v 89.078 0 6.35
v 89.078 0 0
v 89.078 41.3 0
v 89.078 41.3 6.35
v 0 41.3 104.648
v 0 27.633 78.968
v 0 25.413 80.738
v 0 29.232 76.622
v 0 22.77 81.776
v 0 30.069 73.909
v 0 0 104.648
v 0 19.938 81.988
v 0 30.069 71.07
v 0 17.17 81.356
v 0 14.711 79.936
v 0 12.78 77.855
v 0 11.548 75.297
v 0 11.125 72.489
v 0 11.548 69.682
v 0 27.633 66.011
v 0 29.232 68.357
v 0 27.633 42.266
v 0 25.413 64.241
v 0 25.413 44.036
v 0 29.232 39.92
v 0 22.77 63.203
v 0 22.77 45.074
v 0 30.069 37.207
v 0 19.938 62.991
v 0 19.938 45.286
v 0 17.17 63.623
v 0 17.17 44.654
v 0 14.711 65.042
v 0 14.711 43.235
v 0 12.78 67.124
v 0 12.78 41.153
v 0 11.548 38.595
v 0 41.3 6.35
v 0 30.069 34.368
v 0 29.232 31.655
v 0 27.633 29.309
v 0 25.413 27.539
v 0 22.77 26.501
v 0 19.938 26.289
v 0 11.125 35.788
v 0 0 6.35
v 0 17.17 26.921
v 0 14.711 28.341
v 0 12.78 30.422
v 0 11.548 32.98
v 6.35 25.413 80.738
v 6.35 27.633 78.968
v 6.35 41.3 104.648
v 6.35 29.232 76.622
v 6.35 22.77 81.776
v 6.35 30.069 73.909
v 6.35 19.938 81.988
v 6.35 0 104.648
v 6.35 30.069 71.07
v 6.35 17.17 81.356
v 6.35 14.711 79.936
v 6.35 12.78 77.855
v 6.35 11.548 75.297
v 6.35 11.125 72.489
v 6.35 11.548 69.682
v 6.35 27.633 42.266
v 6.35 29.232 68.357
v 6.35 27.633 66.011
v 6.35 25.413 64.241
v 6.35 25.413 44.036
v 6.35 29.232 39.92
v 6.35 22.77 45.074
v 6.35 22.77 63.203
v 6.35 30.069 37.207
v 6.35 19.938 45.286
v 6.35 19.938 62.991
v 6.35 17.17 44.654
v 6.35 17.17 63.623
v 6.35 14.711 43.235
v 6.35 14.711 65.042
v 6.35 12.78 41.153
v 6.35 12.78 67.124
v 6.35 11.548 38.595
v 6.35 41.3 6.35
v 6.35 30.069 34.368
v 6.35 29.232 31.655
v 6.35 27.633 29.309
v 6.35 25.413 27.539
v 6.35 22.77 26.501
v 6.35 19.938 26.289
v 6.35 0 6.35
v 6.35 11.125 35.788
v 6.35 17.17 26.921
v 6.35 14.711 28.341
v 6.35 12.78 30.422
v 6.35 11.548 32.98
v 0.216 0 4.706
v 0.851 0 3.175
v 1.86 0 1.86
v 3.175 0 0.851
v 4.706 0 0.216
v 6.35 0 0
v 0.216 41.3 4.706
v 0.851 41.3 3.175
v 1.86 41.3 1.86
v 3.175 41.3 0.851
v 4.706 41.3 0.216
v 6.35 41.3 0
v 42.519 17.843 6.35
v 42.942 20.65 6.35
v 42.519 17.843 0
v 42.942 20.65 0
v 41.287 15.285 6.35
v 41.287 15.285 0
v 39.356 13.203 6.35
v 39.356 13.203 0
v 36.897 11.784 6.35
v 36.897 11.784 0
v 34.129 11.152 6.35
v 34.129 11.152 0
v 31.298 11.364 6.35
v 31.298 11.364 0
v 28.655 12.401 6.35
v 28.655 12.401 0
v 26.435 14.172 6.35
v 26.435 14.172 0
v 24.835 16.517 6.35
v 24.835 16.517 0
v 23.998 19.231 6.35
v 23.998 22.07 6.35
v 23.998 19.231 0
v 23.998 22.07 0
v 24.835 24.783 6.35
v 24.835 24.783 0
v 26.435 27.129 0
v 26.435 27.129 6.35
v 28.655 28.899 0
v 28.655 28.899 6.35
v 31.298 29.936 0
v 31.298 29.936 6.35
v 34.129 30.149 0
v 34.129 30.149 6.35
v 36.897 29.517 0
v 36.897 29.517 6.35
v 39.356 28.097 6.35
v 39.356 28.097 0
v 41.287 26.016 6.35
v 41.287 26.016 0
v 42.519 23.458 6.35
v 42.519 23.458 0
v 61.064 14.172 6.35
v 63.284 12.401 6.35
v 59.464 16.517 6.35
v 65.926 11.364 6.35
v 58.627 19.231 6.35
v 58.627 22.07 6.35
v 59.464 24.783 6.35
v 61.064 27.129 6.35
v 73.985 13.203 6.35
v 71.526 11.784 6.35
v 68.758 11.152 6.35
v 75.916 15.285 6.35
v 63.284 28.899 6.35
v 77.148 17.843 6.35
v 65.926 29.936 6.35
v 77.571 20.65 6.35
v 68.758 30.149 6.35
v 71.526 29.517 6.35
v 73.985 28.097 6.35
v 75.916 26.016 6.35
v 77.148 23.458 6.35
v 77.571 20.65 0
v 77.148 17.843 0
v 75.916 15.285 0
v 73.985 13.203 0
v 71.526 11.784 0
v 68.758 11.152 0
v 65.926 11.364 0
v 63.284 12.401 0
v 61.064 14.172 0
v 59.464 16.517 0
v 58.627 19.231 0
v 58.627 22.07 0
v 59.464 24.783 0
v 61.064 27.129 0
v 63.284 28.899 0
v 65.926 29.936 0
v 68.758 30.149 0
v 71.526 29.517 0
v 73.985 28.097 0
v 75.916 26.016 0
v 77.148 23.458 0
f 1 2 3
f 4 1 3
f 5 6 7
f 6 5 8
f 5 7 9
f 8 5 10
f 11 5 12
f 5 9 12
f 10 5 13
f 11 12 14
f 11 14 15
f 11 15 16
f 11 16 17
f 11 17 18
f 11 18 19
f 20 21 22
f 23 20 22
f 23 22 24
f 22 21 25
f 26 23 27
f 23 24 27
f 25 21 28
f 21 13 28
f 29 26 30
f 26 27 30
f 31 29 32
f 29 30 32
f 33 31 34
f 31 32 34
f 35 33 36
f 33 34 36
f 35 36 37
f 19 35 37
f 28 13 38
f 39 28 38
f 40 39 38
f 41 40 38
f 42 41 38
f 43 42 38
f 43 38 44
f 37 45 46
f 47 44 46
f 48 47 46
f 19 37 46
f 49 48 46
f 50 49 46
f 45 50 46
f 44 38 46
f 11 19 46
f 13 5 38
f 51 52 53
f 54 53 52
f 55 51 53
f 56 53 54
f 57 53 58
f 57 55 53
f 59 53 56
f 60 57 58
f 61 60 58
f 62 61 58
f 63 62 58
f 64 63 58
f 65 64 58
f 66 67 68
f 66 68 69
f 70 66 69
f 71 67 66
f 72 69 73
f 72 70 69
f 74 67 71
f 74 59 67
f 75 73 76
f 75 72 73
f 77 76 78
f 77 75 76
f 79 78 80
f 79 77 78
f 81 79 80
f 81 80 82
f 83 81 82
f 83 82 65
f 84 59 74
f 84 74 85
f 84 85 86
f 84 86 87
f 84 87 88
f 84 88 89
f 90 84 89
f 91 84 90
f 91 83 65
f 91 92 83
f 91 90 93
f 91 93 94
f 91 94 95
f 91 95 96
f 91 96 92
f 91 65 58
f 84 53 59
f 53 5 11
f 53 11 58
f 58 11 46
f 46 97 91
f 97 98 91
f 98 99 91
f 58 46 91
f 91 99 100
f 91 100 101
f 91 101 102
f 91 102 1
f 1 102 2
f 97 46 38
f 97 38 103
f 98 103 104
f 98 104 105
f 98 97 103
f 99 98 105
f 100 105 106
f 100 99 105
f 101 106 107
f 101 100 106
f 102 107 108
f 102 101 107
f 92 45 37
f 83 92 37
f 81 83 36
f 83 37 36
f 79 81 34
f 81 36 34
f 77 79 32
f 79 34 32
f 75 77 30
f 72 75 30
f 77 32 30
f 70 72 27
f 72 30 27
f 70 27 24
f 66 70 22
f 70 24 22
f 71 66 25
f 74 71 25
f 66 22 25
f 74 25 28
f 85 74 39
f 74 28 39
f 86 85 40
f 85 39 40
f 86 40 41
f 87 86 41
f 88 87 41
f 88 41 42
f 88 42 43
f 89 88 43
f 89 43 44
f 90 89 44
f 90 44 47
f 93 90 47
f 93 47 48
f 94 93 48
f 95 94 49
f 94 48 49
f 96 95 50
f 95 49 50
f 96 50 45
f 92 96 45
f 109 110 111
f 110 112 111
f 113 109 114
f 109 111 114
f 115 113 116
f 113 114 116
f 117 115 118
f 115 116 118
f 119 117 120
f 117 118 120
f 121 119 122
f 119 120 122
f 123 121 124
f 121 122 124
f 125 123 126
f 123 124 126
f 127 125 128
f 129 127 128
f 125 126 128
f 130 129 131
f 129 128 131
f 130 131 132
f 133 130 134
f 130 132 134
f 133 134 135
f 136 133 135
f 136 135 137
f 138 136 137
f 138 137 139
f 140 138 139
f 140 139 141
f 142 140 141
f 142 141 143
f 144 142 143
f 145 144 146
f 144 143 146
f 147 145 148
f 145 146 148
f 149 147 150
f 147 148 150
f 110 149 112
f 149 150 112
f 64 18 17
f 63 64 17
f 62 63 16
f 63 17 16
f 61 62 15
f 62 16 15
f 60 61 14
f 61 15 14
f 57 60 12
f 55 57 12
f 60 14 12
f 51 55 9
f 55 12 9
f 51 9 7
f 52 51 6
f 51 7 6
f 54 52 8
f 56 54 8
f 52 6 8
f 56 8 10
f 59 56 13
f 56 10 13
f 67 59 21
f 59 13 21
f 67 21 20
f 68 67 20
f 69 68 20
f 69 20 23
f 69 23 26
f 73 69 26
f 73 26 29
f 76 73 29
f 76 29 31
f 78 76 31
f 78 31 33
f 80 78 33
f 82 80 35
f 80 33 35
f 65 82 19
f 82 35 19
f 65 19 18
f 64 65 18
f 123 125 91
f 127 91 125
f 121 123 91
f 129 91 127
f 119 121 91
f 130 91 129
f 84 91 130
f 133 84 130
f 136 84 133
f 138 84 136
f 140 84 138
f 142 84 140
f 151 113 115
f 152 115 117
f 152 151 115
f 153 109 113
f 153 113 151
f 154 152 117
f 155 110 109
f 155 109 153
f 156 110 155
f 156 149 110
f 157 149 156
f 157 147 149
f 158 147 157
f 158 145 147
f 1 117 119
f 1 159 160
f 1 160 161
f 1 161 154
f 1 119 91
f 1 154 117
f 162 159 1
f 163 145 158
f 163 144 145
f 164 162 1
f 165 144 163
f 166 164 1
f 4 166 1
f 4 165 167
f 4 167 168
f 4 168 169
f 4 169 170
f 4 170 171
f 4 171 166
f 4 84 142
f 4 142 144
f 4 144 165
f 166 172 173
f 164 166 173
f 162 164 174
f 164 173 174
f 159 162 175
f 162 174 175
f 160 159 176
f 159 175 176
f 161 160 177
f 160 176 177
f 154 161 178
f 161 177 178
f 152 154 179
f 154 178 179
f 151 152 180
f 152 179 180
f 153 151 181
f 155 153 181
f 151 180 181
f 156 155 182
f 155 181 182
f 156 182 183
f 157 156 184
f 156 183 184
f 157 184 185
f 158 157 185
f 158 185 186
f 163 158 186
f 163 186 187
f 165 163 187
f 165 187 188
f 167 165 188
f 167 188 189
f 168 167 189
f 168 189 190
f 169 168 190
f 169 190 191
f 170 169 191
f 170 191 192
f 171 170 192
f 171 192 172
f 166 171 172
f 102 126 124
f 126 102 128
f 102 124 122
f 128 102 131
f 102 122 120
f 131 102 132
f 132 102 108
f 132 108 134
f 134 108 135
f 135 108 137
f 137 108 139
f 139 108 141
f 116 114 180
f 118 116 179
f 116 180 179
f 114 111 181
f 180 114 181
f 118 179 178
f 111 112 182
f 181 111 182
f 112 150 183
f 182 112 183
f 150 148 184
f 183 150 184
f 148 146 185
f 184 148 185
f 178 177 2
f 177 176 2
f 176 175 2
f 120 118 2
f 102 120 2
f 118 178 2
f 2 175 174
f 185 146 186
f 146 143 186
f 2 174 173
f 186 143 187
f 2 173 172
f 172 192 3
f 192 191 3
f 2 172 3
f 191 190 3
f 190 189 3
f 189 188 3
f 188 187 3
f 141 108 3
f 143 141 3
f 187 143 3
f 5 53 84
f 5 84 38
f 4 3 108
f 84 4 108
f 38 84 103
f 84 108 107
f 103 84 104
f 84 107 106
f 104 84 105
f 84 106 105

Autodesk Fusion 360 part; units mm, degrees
sketch "Sketch1" plane through (0, 0, 0) normal (0, 0, 1) x (1, 0, 0)
  line L0 (0, 0) -> (89.0778, 0)
  line L1 (89.0778, 0) -> (89.0778, 41.3004)
  line L2 (89.0778, 41.3004) -> (0, 41.3004)
  line L3 (0, 41.3004) -> (0, 0)
  line L4 (0, 41.3004) -> (6.35, 41.3004)
  line L5 (6.35, 41.3004) -> (6.35, 0)
  line L6 (6.35, 0) -> (0, 0)
  line L7 (0, 0) -> (0, 41.3004)
  circle A0 centre (33.4171, 20.6502) radius 9.525
  circle A1 centre (68.046, 20.6502) radius 9.525
  point P0 (50.7316, 20.6502)
  dimension "d1" = 89.0778
  dimension "d2" = 41.3004
  dimension "d7" = 6.35
  dimension "d12" = 19.05
  dimension "d19" = 17.3145
  dimension "d20" = 17.3145
extrude "Extrude1" add sketch "Sketch1" along normal blind 6.35 contours L0 L2 L3 L4 L5 L6 L7 | L0 L1 L2 L5 | A0 | A1
extrude "Extrude2" add sketch "Sketch1" along normal blind 104.648 contours L0 L2 L3 L4 L5 L6 L7
fillet "Fillet1" radius 6.35 1 edges at (0, 20.6502, 0)
extrude "Extrude3" cut sketch "Sketch1" along normal blind 129.54 contours A0 | A1
sketch "Sketch2" plane through (0, 0, 0) normal (-1, 0, 0) x (0, -1, 0)
  line L0 (-41.3004, 6.35) -> (0, 6.35)
  line L1 (0, 6.35) -> (0, 104.648)
  line L2 (0, 104.648) -> (-41.3004, 104.648)
  line L3 (-41.3004, 104.648) -> (-41.3004, 6.35)
  line L4 (-20.6502, 104.648) -> (-20.6502, 6.35) construction
  circle A0 centre (-20.6502, 72.4894) radius 9.525
  circle A1 centre (-20.6502, 35.7876) radius 9.525
  dimension "d15" = 19.05
  dimension "d16" = 19.05
extrude "Extrude4" cut sketch "Sketch2" against normal blind 182.88 contours A0 | A1
equation "d20 = d19"
